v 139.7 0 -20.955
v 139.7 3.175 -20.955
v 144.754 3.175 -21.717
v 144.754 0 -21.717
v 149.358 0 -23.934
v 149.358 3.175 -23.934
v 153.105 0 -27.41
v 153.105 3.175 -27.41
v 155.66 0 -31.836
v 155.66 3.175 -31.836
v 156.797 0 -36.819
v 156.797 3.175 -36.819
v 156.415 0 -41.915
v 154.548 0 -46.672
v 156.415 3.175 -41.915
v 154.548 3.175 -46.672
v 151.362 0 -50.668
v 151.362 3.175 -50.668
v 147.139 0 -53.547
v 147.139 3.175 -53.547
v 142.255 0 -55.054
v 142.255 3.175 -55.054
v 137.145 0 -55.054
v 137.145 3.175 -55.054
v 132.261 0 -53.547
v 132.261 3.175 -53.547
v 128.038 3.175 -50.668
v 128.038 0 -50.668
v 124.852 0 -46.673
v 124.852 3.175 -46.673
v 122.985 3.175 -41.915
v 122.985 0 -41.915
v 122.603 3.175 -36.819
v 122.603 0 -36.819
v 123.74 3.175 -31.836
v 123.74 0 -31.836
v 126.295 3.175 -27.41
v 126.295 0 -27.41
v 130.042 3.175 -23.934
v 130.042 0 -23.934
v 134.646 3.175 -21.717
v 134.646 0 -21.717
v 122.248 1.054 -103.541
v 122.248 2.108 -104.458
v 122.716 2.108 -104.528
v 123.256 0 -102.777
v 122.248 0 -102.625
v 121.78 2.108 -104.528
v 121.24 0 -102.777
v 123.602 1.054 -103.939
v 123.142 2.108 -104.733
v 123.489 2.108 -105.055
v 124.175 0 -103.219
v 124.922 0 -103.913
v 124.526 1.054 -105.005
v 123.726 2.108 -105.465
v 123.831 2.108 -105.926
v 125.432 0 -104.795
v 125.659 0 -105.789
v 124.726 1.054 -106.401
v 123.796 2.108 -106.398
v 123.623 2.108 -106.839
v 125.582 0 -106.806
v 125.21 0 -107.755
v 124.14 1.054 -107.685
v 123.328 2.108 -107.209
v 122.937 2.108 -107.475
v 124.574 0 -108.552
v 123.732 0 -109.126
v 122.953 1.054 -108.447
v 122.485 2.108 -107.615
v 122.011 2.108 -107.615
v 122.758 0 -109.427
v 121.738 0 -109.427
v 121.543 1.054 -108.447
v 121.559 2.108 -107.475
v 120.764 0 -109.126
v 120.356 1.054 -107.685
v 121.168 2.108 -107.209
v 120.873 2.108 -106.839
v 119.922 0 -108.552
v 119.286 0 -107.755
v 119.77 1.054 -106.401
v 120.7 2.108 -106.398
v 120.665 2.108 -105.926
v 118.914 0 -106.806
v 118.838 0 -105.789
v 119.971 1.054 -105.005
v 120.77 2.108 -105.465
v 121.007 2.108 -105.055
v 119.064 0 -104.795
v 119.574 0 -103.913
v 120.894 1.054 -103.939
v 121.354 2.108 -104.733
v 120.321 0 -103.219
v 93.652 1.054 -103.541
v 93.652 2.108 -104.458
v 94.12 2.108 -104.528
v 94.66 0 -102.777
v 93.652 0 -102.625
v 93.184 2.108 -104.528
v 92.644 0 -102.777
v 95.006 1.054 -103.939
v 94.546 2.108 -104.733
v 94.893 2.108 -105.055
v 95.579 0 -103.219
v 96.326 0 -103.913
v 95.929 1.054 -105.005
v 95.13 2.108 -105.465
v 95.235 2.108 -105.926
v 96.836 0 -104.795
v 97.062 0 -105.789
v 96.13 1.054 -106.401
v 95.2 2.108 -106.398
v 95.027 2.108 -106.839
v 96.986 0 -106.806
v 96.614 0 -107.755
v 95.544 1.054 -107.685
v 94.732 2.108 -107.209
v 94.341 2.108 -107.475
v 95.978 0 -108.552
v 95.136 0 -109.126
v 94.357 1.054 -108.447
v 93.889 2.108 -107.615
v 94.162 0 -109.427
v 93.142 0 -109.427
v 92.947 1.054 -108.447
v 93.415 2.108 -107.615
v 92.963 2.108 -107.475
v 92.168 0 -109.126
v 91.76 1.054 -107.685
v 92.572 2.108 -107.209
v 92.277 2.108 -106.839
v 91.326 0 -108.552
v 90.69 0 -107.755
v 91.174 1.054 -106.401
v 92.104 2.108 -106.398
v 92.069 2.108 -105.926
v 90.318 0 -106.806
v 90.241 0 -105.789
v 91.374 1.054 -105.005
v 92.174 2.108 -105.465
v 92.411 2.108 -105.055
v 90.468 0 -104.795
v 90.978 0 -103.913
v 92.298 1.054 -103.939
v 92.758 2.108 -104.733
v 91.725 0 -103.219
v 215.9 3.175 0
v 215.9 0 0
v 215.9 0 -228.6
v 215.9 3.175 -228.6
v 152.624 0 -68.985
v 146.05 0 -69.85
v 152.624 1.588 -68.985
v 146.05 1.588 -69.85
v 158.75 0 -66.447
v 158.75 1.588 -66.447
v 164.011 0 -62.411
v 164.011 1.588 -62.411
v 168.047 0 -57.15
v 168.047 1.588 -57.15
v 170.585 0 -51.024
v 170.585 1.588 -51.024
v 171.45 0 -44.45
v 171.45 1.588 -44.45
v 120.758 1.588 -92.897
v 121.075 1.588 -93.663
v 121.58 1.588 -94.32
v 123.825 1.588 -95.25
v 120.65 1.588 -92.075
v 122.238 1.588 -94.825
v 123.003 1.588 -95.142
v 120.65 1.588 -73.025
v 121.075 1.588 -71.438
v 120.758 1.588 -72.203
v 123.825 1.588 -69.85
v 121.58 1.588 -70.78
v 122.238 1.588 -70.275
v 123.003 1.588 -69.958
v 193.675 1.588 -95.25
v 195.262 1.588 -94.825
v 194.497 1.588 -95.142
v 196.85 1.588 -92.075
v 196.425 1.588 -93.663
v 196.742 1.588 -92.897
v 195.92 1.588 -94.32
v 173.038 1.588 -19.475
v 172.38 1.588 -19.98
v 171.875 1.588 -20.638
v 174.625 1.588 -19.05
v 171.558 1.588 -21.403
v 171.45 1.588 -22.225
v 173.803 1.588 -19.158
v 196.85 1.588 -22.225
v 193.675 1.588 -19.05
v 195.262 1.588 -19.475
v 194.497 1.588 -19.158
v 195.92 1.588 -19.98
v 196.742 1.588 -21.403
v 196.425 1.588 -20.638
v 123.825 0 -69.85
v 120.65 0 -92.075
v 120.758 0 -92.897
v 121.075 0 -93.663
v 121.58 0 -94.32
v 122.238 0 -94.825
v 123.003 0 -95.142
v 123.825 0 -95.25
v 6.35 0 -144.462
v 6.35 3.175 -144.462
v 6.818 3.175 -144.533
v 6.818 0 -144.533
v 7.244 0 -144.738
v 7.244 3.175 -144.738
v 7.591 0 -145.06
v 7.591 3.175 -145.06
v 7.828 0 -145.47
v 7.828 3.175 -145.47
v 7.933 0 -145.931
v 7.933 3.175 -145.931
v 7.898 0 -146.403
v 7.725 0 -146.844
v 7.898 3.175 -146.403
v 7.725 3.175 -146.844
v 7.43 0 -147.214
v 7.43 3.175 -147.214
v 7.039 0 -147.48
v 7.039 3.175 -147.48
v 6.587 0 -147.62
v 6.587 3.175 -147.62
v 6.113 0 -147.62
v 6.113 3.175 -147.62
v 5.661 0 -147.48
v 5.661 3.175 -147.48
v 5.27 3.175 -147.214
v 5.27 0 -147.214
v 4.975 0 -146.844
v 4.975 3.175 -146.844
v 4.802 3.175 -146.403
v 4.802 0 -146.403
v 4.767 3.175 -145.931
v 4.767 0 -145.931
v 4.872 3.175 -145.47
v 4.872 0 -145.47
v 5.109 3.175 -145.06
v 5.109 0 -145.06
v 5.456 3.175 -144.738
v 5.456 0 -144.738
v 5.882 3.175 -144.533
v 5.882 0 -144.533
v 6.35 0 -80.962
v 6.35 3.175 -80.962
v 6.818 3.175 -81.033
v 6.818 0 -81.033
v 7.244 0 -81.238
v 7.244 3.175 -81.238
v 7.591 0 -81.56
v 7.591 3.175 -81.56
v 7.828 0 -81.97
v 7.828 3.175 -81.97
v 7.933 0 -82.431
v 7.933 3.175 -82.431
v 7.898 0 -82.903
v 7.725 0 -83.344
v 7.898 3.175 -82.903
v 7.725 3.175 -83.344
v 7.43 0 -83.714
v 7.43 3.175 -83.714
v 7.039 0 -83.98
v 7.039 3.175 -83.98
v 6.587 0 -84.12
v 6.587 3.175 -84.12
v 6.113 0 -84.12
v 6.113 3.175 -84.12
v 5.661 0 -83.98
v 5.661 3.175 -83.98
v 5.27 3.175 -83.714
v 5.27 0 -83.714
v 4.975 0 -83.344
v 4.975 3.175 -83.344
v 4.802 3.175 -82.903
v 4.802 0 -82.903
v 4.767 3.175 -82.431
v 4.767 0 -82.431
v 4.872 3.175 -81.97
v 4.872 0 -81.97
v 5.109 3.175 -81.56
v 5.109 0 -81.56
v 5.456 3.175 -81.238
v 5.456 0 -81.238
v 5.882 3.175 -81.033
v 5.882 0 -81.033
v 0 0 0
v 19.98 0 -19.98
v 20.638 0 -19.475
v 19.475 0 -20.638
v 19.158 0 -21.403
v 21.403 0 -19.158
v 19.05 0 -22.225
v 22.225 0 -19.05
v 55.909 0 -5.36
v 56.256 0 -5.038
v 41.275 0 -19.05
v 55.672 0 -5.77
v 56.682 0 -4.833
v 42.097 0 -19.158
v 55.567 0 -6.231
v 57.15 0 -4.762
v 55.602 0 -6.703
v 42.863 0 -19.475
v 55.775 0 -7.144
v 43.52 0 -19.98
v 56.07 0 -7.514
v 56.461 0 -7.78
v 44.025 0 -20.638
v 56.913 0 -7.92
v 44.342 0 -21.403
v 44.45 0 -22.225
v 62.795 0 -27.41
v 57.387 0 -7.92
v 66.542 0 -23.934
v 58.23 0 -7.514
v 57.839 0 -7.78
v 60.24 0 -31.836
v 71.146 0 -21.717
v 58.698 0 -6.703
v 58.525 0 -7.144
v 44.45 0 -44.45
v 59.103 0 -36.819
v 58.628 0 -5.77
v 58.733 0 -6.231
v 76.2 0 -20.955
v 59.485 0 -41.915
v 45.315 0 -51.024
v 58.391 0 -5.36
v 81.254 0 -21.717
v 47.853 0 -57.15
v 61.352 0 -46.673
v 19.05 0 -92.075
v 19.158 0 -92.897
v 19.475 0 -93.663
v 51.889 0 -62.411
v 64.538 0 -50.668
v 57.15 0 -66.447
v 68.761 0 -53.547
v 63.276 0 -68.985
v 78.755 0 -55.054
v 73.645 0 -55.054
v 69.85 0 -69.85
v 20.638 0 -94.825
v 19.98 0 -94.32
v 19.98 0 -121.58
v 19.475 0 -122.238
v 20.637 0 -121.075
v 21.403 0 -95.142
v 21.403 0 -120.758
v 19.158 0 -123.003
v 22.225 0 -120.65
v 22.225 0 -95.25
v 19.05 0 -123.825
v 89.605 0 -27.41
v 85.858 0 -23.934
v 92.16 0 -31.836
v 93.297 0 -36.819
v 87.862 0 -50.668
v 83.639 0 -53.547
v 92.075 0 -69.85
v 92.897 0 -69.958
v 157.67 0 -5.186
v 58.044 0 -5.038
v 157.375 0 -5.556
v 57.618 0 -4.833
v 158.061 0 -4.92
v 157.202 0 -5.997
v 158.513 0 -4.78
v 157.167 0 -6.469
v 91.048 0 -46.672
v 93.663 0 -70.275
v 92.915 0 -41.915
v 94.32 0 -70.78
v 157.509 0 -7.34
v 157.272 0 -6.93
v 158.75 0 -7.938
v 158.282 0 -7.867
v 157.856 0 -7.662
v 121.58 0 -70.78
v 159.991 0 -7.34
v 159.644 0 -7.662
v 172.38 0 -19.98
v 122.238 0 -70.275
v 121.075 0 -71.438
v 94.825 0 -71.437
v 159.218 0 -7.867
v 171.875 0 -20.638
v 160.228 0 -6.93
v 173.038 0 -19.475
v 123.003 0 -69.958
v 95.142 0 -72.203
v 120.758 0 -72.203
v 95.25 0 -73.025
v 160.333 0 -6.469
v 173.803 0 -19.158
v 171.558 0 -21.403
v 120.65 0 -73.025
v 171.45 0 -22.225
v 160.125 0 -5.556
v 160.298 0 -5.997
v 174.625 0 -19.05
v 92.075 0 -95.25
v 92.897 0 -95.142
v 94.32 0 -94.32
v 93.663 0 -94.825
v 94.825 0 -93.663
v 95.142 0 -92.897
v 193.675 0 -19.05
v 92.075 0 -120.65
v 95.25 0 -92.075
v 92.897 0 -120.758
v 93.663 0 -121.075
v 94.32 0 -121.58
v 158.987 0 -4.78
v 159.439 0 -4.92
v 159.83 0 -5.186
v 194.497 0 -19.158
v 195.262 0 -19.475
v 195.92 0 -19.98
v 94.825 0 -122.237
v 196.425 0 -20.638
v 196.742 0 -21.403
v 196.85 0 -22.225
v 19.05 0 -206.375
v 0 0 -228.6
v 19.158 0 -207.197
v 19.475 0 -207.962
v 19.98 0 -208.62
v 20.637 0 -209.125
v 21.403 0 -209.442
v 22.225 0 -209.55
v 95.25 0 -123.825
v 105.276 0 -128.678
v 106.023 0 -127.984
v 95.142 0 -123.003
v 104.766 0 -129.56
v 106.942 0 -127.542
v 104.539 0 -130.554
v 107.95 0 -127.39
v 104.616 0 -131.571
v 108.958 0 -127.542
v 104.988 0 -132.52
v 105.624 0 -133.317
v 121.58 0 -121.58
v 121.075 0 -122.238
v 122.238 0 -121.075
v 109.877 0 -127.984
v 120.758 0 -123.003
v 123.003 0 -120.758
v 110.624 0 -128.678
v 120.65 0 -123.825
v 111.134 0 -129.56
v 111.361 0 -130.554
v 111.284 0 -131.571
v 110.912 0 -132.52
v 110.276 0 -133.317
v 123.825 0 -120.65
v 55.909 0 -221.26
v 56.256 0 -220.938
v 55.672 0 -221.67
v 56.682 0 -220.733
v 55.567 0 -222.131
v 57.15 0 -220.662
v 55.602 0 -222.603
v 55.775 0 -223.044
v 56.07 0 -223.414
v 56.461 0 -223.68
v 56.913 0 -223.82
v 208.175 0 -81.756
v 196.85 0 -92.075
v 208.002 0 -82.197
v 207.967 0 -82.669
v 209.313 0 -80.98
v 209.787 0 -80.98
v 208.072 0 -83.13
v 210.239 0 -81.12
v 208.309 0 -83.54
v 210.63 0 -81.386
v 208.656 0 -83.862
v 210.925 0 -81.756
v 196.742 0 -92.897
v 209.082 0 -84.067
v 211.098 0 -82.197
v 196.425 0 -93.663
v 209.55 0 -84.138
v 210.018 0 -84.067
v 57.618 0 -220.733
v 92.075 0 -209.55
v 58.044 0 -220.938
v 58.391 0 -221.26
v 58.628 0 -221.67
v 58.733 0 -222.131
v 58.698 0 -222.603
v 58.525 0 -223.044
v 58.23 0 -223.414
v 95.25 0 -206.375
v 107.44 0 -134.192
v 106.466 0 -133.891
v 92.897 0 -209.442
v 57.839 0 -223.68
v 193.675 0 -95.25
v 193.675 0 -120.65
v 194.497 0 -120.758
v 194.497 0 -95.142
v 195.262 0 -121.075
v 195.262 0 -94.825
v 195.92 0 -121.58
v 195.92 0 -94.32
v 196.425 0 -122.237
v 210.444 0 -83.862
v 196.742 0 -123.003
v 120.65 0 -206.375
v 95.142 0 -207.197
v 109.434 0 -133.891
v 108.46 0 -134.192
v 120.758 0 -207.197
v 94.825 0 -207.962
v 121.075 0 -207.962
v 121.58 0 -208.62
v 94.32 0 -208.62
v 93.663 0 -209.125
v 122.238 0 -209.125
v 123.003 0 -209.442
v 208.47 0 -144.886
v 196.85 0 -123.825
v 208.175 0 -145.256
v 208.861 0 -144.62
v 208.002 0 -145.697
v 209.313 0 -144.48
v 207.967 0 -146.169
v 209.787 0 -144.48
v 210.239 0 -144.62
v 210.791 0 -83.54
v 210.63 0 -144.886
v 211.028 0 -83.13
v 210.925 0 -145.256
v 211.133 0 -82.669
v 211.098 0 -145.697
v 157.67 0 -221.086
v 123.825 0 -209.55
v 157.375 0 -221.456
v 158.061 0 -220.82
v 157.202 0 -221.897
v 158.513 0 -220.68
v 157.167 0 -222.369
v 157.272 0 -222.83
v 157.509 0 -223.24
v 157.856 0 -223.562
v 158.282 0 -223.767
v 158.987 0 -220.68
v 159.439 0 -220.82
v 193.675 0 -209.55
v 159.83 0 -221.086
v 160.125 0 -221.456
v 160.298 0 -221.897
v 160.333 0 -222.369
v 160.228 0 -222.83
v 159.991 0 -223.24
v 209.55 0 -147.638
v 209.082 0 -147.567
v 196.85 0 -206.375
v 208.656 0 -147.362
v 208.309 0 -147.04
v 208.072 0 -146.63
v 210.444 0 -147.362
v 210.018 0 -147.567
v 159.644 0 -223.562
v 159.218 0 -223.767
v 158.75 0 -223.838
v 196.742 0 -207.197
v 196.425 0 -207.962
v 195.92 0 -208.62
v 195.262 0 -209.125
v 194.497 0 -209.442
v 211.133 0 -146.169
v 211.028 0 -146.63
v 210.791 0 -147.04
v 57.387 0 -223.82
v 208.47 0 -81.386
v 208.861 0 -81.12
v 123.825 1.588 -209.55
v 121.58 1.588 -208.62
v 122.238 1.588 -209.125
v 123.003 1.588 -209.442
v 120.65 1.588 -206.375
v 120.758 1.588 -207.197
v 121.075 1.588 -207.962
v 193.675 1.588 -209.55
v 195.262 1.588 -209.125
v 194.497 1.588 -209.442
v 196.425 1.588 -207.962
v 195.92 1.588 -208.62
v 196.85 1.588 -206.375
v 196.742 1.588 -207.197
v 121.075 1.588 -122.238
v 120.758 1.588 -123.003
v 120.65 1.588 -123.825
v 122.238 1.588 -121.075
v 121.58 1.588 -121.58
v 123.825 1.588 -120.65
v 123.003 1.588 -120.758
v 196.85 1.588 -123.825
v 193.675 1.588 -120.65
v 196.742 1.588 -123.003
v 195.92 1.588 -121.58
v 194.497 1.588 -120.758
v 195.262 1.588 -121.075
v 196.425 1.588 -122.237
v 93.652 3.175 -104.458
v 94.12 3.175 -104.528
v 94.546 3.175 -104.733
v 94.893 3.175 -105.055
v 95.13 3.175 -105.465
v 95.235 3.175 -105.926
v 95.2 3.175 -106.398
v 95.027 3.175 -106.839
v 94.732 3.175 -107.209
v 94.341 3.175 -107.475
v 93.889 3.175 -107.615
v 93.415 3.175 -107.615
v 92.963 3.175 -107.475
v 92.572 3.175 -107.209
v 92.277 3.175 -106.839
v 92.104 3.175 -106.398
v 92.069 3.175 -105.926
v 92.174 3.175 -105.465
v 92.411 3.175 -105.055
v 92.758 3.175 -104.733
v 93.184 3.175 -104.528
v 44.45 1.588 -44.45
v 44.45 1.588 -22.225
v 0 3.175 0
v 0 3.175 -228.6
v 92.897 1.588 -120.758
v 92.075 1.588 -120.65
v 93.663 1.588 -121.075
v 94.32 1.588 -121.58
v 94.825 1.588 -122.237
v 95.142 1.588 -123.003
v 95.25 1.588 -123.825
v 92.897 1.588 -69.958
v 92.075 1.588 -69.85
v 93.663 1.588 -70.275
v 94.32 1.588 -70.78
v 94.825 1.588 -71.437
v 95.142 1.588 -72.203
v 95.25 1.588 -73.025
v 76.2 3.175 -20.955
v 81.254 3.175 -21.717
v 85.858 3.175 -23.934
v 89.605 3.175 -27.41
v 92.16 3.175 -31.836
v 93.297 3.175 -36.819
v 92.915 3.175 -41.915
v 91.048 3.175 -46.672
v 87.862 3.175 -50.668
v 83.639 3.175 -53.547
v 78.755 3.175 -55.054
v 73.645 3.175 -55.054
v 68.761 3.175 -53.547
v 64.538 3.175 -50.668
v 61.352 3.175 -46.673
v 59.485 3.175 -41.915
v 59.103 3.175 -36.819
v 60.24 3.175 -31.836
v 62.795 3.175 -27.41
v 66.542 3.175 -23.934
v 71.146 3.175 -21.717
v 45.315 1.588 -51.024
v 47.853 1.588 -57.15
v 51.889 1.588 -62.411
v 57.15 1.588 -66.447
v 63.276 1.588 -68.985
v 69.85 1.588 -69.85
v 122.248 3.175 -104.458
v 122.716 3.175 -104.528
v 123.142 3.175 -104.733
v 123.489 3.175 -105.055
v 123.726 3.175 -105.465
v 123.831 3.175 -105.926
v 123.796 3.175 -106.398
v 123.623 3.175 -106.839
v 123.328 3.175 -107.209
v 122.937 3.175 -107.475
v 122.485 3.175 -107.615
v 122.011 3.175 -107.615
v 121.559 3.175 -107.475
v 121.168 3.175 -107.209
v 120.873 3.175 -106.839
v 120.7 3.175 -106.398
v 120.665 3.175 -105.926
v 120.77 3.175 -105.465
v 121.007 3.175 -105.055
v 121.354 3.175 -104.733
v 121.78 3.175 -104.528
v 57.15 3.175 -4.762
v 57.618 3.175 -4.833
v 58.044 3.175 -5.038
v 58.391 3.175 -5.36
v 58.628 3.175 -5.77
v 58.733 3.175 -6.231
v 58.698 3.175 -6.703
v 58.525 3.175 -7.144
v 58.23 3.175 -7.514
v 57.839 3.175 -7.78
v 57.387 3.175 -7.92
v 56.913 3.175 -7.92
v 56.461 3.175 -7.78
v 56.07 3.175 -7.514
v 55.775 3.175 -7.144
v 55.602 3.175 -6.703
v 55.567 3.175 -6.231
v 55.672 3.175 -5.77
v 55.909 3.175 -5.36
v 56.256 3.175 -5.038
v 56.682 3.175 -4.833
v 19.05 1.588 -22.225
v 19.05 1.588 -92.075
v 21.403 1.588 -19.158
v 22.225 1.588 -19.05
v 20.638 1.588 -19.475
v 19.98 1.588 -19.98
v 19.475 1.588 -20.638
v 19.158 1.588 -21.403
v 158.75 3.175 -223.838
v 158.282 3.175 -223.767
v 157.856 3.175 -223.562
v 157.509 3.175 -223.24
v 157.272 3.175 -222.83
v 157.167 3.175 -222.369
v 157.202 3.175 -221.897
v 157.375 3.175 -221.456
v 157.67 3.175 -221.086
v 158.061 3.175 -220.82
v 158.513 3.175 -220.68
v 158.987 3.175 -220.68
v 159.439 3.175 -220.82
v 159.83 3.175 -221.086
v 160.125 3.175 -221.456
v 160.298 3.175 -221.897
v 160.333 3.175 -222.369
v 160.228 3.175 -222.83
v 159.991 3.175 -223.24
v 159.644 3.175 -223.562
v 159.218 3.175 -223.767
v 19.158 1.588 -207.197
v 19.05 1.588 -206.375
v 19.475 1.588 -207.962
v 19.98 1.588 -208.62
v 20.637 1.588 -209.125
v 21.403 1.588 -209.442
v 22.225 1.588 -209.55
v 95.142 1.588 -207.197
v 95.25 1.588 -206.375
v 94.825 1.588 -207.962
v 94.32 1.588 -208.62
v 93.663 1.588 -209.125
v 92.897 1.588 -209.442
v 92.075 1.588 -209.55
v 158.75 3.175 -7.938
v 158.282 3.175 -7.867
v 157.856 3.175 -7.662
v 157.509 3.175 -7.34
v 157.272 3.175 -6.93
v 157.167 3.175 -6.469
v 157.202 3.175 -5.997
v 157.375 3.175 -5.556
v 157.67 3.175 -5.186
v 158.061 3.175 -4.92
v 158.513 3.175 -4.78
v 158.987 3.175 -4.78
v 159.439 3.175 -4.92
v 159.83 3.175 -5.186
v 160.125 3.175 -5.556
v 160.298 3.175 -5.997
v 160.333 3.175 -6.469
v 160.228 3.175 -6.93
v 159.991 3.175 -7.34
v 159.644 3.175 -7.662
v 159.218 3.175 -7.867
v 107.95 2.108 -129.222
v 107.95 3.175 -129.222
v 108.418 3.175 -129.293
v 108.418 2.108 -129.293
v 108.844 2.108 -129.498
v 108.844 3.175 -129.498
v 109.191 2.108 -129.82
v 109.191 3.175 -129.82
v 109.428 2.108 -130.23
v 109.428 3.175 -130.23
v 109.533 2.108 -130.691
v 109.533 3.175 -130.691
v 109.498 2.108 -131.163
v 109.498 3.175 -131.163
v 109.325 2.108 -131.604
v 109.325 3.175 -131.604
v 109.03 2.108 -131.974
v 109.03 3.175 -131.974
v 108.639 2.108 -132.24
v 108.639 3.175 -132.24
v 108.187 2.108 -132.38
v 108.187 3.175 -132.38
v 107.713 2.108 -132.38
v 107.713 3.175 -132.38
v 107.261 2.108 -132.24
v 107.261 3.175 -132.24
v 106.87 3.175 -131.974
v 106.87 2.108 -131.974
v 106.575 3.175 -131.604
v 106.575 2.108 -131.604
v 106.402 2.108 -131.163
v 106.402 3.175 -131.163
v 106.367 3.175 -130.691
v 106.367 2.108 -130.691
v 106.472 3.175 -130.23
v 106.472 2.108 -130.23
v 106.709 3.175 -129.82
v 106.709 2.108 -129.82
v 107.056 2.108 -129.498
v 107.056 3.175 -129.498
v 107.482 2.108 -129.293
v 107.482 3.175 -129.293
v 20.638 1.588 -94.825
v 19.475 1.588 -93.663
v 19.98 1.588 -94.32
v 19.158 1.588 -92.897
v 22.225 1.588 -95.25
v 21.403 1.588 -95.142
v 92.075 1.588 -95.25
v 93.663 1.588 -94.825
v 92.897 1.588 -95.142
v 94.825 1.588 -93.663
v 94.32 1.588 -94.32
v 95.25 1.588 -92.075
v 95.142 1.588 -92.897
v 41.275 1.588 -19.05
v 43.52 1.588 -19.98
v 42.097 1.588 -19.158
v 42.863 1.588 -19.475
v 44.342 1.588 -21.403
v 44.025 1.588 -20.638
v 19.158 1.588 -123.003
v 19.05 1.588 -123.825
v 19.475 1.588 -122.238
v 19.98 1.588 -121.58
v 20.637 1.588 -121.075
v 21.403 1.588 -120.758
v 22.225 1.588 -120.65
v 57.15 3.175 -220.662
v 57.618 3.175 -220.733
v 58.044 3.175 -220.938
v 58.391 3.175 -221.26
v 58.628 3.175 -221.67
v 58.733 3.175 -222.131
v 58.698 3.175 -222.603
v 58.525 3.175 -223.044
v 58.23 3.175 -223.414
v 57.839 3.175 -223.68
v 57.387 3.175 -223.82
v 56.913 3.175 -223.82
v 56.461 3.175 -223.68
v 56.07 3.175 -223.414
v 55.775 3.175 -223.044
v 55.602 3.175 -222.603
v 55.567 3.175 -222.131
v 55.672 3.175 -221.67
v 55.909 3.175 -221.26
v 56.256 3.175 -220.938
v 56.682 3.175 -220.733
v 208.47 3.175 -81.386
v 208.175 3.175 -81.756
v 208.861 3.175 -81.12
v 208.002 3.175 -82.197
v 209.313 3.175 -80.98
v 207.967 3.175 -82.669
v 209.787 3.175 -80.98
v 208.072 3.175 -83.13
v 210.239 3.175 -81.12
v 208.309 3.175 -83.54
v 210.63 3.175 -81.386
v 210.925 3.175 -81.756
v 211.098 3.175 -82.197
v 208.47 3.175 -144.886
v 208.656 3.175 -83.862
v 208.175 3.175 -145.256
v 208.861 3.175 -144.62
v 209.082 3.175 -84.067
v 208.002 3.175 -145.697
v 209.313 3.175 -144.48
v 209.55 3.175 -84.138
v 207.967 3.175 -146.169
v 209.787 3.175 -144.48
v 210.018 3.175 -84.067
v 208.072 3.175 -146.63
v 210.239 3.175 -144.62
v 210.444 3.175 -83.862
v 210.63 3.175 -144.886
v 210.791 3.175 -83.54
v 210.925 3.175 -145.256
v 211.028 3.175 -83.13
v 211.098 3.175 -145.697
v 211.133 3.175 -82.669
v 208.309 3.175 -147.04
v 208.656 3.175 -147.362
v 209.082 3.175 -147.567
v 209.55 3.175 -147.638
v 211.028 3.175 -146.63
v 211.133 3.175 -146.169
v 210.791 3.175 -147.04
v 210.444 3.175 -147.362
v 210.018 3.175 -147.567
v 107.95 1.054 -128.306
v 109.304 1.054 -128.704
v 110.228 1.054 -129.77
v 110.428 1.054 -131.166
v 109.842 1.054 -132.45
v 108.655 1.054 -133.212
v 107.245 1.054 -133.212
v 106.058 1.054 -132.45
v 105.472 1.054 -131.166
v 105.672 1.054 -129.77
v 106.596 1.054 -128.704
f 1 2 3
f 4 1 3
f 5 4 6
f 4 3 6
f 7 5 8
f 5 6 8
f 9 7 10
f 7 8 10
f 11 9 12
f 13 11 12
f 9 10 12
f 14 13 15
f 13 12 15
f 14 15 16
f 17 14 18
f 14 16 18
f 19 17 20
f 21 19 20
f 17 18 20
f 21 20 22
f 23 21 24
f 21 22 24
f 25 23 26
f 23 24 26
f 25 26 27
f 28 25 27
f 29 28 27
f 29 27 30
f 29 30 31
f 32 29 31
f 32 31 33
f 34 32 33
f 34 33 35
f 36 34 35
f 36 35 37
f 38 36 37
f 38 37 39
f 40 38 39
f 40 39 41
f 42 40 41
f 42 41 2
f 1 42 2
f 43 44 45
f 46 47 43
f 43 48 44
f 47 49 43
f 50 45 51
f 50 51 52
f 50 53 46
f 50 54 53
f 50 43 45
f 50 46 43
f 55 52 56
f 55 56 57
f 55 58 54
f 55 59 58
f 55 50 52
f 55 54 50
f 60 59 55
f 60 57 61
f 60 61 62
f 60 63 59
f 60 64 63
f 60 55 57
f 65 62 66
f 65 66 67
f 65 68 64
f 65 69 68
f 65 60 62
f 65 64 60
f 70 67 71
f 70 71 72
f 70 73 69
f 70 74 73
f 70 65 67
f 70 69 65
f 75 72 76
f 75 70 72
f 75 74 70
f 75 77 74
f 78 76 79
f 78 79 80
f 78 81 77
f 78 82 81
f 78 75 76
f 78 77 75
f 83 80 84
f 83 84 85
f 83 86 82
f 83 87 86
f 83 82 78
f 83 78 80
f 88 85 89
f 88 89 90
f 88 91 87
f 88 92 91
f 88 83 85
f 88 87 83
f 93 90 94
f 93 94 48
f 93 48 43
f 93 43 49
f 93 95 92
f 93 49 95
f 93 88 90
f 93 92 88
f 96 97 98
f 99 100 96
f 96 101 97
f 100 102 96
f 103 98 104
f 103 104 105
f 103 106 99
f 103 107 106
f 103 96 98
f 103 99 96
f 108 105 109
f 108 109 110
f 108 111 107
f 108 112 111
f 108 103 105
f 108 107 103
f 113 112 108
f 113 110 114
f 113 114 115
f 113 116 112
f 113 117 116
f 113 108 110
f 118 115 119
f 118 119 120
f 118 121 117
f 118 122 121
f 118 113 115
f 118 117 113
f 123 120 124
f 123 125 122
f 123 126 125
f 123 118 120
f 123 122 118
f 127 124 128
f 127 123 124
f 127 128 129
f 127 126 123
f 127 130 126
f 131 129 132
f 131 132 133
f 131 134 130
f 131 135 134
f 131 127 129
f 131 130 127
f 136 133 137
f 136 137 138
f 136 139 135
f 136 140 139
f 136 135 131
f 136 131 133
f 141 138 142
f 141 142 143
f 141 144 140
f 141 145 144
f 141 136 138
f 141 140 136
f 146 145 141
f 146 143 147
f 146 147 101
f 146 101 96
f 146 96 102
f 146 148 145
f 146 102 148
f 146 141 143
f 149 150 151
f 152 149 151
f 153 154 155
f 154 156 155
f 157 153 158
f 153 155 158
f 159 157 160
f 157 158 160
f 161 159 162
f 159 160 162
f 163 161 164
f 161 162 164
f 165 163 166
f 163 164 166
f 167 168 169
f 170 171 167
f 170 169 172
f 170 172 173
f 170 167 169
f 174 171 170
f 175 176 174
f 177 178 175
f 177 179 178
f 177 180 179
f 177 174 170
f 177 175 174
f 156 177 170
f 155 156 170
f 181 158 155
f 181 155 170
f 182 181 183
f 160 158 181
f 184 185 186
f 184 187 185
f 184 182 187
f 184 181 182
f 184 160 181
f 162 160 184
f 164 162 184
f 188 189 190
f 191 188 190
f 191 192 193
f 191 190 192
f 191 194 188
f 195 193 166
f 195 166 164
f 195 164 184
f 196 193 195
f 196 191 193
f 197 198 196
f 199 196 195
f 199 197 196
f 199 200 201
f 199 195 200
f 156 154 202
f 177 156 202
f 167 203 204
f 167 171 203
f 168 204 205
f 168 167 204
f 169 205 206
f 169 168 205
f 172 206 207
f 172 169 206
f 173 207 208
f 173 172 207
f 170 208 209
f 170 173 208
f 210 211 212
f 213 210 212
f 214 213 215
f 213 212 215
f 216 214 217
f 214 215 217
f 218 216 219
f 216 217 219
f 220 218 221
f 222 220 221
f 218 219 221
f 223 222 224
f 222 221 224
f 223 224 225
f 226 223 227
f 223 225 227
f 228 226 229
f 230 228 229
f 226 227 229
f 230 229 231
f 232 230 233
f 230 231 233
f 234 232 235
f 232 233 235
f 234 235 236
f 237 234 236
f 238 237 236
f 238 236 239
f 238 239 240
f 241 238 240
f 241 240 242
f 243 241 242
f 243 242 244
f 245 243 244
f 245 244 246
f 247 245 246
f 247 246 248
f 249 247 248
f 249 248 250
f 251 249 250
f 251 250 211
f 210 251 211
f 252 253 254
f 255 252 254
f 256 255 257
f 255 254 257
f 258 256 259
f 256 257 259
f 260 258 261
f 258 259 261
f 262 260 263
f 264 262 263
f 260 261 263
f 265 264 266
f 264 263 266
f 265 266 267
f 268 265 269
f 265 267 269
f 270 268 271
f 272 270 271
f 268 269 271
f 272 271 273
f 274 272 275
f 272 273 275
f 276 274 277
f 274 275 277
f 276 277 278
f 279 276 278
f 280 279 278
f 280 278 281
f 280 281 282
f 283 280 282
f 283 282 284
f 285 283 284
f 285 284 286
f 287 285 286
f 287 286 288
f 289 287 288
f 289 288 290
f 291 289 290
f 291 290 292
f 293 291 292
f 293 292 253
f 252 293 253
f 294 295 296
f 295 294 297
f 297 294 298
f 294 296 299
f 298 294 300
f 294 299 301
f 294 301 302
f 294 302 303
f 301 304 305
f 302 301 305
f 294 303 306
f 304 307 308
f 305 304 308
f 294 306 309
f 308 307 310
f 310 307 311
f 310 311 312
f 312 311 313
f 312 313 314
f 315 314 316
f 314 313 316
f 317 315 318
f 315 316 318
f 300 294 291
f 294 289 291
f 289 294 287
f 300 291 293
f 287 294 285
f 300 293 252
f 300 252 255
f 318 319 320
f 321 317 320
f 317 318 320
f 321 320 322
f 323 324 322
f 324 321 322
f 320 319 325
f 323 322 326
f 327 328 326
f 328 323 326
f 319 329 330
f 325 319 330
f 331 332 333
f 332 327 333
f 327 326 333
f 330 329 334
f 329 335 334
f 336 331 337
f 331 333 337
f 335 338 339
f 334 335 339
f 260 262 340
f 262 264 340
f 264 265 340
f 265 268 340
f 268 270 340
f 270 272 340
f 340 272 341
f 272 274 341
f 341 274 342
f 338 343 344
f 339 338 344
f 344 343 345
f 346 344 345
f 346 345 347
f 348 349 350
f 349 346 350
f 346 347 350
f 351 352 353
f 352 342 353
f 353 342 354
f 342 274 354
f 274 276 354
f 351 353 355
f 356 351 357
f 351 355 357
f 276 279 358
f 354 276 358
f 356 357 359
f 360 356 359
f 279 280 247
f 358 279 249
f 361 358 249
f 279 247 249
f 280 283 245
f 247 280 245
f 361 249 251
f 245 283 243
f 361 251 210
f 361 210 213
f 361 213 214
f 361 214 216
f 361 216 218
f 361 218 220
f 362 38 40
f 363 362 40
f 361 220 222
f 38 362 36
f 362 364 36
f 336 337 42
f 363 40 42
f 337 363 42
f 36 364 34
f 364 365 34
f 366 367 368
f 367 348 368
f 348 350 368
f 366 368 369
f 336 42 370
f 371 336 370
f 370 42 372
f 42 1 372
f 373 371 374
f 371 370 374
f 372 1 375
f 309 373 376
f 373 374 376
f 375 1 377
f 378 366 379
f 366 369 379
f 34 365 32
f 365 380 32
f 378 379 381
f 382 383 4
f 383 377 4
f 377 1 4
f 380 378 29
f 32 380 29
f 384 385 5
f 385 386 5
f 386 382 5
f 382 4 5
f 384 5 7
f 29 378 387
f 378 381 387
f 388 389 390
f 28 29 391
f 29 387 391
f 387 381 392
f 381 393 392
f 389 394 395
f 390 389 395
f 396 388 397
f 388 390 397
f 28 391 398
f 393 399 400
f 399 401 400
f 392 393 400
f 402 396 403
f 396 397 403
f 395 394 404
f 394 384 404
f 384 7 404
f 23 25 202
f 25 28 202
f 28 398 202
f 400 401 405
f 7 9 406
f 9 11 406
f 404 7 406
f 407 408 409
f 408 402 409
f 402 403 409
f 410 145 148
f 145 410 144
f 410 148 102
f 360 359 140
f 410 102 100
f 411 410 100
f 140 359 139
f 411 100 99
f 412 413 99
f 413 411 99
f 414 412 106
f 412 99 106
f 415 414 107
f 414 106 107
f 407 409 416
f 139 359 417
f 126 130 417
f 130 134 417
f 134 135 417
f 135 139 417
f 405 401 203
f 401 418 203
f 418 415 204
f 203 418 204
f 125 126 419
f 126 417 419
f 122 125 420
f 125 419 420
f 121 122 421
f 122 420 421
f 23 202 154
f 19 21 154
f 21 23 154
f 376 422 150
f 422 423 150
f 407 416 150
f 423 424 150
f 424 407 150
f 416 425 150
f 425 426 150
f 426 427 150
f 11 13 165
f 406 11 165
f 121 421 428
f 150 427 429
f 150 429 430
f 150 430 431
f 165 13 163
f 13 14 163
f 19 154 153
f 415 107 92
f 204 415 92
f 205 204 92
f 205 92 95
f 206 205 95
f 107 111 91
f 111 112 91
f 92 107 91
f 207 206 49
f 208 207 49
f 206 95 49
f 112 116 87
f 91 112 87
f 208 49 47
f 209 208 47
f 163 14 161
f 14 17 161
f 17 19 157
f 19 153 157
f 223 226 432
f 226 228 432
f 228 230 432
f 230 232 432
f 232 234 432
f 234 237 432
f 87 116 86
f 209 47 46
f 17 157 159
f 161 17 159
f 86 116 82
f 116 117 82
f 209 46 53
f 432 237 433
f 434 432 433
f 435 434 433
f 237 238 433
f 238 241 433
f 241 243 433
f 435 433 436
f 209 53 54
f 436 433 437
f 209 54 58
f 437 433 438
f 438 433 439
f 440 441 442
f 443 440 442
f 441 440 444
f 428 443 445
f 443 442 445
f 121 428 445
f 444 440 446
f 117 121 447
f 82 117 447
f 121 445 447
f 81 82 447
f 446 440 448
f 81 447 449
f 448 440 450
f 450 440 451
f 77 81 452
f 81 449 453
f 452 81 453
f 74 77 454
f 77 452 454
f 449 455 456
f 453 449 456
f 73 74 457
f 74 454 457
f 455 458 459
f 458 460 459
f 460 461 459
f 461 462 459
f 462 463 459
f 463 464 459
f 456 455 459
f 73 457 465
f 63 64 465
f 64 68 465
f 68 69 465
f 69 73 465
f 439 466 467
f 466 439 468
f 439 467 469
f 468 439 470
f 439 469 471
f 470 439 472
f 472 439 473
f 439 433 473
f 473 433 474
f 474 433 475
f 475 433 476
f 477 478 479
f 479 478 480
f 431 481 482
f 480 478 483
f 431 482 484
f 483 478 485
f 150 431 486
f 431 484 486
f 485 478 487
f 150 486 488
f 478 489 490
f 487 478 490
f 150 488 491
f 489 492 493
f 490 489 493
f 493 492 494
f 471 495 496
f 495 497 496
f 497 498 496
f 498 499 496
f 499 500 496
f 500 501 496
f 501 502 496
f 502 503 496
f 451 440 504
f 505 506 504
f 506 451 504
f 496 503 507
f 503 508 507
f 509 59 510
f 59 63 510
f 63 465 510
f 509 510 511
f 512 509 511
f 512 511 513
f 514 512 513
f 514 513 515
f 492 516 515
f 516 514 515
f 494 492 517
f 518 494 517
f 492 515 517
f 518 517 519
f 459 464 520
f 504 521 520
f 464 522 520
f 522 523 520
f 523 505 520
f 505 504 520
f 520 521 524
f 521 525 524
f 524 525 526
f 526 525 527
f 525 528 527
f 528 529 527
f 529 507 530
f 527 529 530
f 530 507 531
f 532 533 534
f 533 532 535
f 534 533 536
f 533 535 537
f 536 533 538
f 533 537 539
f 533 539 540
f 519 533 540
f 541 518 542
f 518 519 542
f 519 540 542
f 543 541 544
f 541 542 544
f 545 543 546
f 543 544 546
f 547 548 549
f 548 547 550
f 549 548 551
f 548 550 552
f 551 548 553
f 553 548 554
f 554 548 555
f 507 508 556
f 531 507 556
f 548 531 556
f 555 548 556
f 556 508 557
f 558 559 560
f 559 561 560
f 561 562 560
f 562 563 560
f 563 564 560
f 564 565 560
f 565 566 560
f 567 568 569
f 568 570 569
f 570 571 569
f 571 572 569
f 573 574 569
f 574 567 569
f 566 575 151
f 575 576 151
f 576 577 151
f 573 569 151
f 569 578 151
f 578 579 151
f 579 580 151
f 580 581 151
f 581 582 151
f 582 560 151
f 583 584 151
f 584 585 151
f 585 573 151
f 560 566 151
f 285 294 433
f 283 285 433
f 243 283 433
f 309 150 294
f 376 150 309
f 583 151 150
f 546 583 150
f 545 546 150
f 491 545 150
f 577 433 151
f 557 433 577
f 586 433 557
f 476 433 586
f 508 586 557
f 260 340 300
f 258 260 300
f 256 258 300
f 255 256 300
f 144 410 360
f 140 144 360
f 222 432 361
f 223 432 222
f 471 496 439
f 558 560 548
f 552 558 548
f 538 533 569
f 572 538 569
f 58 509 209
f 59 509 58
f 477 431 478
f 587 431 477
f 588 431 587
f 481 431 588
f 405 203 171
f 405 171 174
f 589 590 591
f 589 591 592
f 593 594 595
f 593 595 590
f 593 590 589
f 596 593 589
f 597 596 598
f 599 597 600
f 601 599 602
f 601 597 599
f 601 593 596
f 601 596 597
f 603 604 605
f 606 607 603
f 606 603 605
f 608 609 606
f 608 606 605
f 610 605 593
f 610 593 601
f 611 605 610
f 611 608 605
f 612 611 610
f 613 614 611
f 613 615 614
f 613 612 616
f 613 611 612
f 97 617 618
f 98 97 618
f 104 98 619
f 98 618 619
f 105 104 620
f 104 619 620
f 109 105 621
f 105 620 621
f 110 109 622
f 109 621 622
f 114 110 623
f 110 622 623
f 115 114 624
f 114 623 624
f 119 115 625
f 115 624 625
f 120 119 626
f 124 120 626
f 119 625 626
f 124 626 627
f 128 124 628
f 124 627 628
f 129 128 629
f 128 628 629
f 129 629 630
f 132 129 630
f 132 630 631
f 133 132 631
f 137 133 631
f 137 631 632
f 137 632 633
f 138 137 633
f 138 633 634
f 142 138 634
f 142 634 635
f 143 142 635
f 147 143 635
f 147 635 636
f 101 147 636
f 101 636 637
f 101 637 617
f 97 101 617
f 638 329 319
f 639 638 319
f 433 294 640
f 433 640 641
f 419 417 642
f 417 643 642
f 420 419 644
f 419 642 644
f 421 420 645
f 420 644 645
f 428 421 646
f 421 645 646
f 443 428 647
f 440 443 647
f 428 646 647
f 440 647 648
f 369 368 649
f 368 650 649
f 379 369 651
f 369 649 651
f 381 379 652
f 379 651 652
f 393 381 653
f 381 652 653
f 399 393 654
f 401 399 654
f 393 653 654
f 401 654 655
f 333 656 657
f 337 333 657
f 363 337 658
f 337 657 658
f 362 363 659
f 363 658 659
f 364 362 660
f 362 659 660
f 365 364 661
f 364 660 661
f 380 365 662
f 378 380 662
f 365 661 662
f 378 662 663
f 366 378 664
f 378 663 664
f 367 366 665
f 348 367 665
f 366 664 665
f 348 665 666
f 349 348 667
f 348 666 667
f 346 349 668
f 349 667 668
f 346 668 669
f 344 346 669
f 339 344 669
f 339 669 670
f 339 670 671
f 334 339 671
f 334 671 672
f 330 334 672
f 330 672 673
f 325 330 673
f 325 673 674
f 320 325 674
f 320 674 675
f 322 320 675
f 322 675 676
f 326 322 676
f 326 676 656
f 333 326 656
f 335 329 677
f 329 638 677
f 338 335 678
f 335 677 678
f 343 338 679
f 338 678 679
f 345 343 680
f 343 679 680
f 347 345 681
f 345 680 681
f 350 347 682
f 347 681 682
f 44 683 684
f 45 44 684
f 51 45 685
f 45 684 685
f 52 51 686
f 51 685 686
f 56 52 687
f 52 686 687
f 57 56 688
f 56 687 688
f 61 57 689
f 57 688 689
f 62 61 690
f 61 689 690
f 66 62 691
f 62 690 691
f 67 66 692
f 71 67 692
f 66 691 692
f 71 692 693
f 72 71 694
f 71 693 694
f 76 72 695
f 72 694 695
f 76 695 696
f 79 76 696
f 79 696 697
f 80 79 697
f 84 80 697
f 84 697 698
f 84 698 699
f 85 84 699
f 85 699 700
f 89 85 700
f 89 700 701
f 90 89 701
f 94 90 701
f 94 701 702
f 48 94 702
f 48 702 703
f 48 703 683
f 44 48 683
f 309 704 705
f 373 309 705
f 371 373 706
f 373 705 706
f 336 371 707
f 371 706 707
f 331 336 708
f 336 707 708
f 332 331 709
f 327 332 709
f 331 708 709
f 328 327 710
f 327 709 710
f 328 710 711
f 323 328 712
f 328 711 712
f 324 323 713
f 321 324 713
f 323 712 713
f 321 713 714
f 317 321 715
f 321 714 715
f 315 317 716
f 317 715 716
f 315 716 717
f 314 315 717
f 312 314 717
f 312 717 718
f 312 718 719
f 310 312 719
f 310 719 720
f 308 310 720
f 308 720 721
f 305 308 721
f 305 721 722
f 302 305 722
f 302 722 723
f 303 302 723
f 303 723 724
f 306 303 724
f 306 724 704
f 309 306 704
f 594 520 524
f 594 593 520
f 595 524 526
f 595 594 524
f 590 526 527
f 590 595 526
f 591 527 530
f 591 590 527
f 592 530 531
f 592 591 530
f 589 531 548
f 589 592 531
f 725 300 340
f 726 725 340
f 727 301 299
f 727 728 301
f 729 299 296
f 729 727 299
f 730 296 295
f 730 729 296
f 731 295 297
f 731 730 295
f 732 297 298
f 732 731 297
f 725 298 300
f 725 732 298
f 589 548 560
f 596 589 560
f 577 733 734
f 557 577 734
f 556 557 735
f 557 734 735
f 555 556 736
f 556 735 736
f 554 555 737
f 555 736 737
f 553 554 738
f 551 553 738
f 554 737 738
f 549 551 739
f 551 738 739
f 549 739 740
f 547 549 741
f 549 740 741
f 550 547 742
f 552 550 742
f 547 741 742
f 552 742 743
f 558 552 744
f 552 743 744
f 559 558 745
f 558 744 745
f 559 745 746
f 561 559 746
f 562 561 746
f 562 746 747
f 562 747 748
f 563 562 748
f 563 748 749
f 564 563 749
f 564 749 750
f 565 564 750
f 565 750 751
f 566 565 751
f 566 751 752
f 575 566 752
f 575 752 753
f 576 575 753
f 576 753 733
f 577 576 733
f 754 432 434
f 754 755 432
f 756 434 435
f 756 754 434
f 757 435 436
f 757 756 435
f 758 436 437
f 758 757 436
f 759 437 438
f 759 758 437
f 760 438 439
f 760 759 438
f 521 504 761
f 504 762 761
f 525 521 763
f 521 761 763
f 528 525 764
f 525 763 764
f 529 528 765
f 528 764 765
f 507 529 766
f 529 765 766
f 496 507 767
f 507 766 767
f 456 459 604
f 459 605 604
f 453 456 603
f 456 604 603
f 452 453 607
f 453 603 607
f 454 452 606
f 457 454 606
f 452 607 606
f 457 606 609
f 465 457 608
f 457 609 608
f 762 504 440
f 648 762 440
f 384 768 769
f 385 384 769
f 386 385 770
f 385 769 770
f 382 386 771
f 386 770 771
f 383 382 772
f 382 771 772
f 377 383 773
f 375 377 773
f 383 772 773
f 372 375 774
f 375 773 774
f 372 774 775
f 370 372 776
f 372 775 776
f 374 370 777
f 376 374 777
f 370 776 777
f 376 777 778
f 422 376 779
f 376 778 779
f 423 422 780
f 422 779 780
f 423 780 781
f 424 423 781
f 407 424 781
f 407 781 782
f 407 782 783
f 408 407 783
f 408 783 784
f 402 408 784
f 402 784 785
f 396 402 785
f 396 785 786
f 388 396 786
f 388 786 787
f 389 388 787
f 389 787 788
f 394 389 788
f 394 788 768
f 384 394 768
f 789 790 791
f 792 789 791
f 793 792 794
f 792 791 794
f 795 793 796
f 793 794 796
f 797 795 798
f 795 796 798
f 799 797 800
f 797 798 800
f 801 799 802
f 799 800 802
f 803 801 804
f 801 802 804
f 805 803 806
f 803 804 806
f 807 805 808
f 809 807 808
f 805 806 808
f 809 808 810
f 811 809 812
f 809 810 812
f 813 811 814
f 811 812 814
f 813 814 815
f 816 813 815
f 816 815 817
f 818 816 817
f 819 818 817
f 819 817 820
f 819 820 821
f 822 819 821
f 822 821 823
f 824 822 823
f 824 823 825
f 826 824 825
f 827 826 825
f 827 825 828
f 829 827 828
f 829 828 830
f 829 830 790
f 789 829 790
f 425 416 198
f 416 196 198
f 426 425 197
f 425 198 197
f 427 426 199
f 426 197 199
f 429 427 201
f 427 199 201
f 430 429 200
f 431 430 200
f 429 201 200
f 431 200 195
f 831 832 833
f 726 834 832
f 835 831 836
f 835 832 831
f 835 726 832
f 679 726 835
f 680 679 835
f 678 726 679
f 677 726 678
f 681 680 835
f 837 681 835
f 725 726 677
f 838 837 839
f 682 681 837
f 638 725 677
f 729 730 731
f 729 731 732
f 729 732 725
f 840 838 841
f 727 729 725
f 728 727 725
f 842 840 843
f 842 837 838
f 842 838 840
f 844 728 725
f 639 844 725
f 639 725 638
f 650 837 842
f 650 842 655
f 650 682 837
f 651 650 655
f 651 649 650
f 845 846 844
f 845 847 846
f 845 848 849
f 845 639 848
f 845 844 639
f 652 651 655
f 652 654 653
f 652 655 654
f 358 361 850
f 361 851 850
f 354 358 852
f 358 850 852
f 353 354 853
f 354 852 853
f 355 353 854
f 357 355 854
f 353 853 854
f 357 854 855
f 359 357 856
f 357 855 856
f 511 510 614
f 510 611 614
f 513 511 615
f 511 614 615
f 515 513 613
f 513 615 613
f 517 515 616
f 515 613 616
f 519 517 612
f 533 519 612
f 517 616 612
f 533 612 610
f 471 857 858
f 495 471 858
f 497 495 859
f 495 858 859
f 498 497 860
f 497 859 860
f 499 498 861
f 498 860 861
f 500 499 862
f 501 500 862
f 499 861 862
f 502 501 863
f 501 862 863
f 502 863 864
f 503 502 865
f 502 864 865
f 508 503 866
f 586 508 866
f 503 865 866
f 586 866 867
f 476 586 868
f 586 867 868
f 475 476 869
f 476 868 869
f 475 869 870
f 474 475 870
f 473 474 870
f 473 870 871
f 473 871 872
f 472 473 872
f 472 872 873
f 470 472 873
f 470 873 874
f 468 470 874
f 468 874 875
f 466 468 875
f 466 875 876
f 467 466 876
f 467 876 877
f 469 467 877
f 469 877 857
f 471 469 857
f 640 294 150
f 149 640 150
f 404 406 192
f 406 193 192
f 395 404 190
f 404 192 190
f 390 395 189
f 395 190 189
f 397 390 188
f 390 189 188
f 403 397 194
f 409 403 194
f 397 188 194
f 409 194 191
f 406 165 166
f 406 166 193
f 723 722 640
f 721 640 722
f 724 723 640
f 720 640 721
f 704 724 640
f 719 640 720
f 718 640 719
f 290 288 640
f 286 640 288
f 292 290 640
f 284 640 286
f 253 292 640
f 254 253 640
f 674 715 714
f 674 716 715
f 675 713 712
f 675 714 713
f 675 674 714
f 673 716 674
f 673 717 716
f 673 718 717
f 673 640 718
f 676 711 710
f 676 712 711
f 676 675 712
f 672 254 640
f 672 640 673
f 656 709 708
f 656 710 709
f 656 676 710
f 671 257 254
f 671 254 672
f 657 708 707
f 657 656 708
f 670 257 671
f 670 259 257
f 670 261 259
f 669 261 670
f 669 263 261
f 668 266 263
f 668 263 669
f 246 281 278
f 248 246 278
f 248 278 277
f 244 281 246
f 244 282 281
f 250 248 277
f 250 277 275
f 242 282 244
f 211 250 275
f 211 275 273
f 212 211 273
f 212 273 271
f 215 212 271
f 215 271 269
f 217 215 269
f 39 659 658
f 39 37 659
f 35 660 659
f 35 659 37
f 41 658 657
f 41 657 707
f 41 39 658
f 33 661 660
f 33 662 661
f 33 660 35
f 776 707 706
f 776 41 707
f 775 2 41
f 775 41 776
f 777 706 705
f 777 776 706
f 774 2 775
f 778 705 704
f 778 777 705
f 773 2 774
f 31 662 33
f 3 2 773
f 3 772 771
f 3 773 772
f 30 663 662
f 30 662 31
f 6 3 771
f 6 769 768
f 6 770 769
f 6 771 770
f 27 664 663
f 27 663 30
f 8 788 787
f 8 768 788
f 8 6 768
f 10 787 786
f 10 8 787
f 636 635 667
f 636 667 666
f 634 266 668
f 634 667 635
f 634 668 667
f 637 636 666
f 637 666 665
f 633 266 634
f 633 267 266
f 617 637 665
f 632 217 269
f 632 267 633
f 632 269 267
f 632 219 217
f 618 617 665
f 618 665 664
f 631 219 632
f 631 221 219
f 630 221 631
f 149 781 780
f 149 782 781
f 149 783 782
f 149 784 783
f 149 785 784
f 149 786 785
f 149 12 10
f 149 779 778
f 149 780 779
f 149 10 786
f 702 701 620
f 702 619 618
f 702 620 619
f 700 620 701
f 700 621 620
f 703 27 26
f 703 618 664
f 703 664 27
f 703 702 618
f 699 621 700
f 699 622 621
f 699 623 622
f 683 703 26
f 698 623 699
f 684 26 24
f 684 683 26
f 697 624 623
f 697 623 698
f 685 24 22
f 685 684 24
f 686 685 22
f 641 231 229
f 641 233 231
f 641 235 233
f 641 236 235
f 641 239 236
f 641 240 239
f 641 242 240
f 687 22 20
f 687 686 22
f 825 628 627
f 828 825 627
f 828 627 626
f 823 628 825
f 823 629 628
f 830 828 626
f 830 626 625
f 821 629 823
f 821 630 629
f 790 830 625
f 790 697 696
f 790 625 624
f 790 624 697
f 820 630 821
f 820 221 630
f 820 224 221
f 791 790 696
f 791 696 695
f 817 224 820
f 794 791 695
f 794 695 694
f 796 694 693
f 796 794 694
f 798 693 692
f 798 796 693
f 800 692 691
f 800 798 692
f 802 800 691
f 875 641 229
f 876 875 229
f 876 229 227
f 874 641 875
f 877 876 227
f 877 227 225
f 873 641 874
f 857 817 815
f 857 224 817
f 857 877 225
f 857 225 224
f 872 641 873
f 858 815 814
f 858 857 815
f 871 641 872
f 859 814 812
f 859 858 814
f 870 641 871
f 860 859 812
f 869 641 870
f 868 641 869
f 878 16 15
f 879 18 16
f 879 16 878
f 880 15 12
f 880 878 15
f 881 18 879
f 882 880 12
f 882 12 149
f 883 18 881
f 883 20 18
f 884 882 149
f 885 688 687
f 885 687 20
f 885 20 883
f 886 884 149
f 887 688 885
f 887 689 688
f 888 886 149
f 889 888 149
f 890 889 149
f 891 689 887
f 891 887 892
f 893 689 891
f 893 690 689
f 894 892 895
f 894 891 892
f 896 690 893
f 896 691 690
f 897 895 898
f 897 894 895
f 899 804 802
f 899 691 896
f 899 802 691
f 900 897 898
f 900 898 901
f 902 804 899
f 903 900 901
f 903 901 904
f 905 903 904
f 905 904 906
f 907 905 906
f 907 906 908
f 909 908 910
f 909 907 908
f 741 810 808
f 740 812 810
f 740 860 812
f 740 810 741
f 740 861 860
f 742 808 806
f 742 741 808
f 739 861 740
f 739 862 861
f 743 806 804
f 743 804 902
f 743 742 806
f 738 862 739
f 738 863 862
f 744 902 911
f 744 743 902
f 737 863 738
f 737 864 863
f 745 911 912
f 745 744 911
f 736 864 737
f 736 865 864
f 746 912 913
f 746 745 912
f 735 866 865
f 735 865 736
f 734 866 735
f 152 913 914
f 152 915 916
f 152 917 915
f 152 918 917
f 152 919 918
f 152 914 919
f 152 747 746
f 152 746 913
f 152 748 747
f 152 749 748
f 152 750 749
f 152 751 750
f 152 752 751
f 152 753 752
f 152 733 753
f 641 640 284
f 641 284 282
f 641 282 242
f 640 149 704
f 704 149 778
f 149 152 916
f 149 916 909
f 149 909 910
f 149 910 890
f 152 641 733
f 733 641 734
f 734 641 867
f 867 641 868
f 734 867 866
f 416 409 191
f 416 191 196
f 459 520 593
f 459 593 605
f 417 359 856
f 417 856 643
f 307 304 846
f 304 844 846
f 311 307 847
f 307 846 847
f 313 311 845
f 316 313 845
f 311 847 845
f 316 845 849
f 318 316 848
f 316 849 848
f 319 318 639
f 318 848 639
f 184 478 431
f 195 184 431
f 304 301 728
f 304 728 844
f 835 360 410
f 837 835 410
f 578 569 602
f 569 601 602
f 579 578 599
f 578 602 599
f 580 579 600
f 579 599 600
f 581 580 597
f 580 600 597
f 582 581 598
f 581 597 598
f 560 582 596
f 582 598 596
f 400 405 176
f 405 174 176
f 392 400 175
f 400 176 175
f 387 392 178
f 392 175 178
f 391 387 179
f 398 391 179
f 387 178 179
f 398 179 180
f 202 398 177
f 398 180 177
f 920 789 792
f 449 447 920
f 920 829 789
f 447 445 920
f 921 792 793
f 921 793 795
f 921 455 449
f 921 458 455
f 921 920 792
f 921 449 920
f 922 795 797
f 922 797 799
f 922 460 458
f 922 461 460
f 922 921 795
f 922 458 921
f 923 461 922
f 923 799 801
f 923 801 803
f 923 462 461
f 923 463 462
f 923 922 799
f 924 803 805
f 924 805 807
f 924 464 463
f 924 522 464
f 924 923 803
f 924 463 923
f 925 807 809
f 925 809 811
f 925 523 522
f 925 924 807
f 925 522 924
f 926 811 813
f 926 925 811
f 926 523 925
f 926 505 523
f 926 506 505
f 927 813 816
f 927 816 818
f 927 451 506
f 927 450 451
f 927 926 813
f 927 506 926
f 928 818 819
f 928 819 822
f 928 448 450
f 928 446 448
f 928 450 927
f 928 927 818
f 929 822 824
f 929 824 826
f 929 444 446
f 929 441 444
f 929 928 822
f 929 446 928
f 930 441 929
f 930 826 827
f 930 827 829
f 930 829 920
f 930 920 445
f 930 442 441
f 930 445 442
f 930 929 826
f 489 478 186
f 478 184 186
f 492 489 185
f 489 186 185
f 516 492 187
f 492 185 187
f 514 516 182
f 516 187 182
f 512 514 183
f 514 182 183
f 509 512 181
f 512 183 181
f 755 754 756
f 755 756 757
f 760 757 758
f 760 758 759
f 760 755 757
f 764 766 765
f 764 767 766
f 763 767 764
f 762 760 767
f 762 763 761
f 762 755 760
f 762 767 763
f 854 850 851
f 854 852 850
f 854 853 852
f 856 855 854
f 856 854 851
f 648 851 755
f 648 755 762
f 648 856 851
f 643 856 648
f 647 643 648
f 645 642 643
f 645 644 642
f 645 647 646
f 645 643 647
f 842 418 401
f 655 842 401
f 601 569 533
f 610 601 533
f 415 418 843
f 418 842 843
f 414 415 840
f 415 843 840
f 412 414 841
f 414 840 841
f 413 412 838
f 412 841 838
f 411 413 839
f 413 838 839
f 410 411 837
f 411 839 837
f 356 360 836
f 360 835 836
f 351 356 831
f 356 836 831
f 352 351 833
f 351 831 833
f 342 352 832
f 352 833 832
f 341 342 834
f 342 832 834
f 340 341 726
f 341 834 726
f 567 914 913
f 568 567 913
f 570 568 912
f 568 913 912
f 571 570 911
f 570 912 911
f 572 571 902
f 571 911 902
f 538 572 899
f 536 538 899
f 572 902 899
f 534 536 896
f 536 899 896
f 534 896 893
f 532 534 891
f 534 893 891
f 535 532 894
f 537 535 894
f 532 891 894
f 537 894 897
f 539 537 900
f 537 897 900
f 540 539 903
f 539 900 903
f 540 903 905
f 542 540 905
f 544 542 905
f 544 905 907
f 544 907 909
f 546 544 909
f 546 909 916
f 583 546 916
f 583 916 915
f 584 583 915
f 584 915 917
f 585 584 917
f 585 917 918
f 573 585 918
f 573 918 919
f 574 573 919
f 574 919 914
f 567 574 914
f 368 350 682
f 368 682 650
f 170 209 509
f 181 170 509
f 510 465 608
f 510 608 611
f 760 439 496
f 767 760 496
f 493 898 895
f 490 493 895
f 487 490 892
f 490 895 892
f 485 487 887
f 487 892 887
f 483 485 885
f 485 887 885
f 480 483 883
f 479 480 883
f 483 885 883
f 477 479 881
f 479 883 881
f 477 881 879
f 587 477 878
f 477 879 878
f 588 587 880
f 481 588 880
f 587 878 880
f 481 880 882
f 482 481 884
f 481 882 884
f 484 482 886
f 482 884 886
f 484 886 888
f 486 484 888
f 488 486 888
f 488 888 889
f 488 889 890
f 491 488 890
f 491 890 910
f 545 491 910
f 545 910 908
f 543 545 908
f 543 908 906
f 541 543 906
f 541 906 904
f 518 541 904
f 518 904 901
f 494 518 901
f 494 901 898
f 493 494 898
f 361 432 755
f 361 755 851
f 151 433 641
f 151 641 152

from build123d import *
from OCP.BRepFilletAPI import BRepFilletAPI_MakeChamfer

# Parameters (mm, degrees)
SKETCH1_W           = 215.9
SKETCH1_H           = 228.6
BOSS_EXTRUDE1_DEPTH = 3.175
SKETCH2_R           = 17.145
CUT_EXTRUDE1_DEPTH  = 315.453256661
SKETCH3_R           = 1.5875
CUT_EXTRUDE2_DEPTH  = 315.453256661
SKETCH4_R           = 1.5875
CUT_EXTRUDE3_DEPTH  = 315.453256661
CHAMFER1_SIZE       = 2.1082
CHAMFER1_SIZE2      = 1.832630301
SKETCH5_W           = 25.4
SKETCH5_H           = 50.8
SKETCH5_H_2         = 25.4
SKETCH5_W_2         = 50.8
SKETCH5_W_3         = 76.2
SKETCH5_H_3         = 88.9
CUT_EXTRUDE4_DEPTH  = 1.5875
FILLET1_R           = 3.175
FILLET2_R           = 25.4


with BuildPart() as part:
    # Sketch1 → Boss-Extrude1 (new body)
    with BuildSketch(Plane(origin=(0, 0, 0), x_dir=(1, 0, 0), z_dir=(0, 1, 0))):
        with Locations((107.95, 114.3)):
            Rectangle(SKETCH1_W, SKETCH1_H)
    extrude(amount=BOSS_EXTRUDE1_DEPTH)

    # Sketch2 → Cut-Extrude1 (cut, through all)
    with BuildSketch(Plane(origin=(0, 3.175, 0), x_dir=(1, 0, 0), z_dir=(0, 1, 0))):
        with Locations(Location((139.7, 38.1, 0), (0, 0, 270))):
            Circle(SKETCH2_R)
        with Locations(Location((76.2, 38.1, 0), (0, 0, 270))):
            Circle(SKETCH2_R)
    extrude(amount=-CUT_EXTRUDE1_DEPTH, mode=Mode.SUBTRACT)

    # Sketch3 → Cut-Extrude2 (cut, through all)
    with BuildSketch(Plane(origin=(0, 3.175, 0), x_dir=(1, 0, 0), z_dir=(0, 1, 0))):
        with Locations(Location((107.95, 130.81, 0), (0, 0, 270))):
            Circle(SKETCH3_R)
        with Locations(Location((122.248079416, 106.045, 0), (0, 0, 270))):
            Circle(SKETCH3_R)
        with Locations(Location((93.651920584, 106.045, 0), (0, 0, 270))):
            Circle(SKETCH3_R)
    extrude(amount=-CUT_EXTRUDE2_DEPTH, mode=Mode.SUBTRACT)

    # Sketch4 → Cut-Extrude3 (cut, through all)
    with BuildSketch(Plane(origin=(0, 3.175, 0), x_dir=(1, 0, 0), z_dir=(0, 1, 0))):
        with Locations(Location((6.35, 146.05, 0), (0, 0, 270))):
            Circle(SKETCH4_R)
        with Locations(Location((6.35, 82.55, 0), (0, 0, 270))):
            Circle(SKETCH4_R)
        with Locations(Location((57.15, 6.35, 0), (0, 0, 270))):
            Circle(SKETCH4_R)
        with Locations(Location((57.15, 222.25, 0), (0, 0, 270))):
            Circle(SKETCH4_R)
        with Locations(Location((158.75, 6.35, 0), (0, 0, 90))):
            Circle(SKETCH4_R)
        with Locations(Location((209.55, 82.55, 0), (0, 0, 90))):
            Circle(SKETCH4_R)
        with Locations(Location((209.55, 146.05, 0), (0, 0, 90))):
            Circle(SKETCH4_R)
        with Locations(Location((158.75, 222.25, 0), (0, 0, 90))):
            Circle(SKETCH4_R)
    extrude(amount=-CUT_EXTRUDE3_DEPTH, mode=Mode.SUBTRACT)

    # Chamfer1: one chamfer whose edges measure the first distance from different faces: ONE call of the kernel's chamfer builder (chamfer() names one face for all edges)
    chamfer1_edges_1 = [part.edges().sort_by_distance(p)[0] for p in [
        (107.95, 0, -132.3975),
    ]]
    chamfer1_side_1 = [part.faces().sort_by_distance(p)[0] for p in [
        (107.95, 1.5875, -132.3975),
    ]]
    chamfer1_edges_2 = [part.edges().sort_by_distance(p)[0] for p in [
        (122.248079416, 0, -107.6325),
    ]]
    chamfer1_side_2 = [part.faces().sort_by_distance(p)[0] for p in [
        (122.248079416, 1.5875, -107.6325),
    ]]
    chamfer1_edges_3 = [part.edges().sort_by_distance(p)[0] for p in [
        (93.651920584, 0, -107.6325),
    ]]
    chamfer1_side_3 = [part.faces().sort_by_distance(p)[0] for p in [
        (93.651920584, 1.5875, -107.6325),
    ]]
    chamfer1 = BRepFilletAPI_MakeChamfer(part.part.solid().wrapped)
    for e in chamfer1_edges_1:
        chamfer1.Add(CHAMFER1_SIZE, CHAMFER1_SIZE2, e.wrapped, chamfer1_side_1[0].wrapped)  # the first distance lies on this face
    for e in chamfer1_edges_2:
        chamfer1.Add(CHAMFER1_SIZE, CHAMFER1_SIZE2, e.wrapped, chamfer1_side_2[0].wrapped)  # the first distance lies on this face
    for e in chamfer1_edges_3:
        chamfer1.Add(CHAMFER1_SIZE, CHAMFER1_SIZE2, e.wrapped, chamfer1_side_3[0].wrapped)  # the first distance lies on this face
    add(Compound.cast(chamfer1.Shape()), mode=Mode.REPLACE)

    # Sketch5 → Cut-Extrude4 (cut)
    with BuildSketch(Plane.XZ):
        with Locations((31.75, -44.45)):
            Rectangle(SKETCH5_W, SKETCH5_H)
        with Locations((31.75, -82.55)):
            Rectangle(SKETCH5_W, SKETCH5_H_2)
        with Locations((69.85, -82.55)):
            Rectangle(SKETCH5_W_2, SKETCH5_H_2)
        with Locations((57.15, -165.1)):
            Rectangle(SKETCH5_W_3, SKETCH5_H_3)
        with Locations((158.75, -165.1)):
            Rectangle(SKETCH5_W_3, SKETCH5_H_3)
        with Locations((146.05, -82.55)):
            Rectangle(SKETCH5_W_2, SKETCH5_H_2)
        with Locations((184.15, -82.55)):
            Rectangle(SKETCH5_W, SKETCH5_H_2)
        with Locations((184.15, -44.45)):
            Rectangle(SKETCH5_W, SKETCH5_H)
    extrude(amount=-CUT_EXTRUDE4_DEPTH, mode=Mode.SUBTRACT)

    # Fillet1
    fillet1_edges = [part.edges().sort_by_distance(p)[0] for p in [
        (120.65, 0.79375, -120.65),
        (196.85, 0.79375, -120.65),
        (196.85, 0.79375, -209.55),
        (120.65, 0.79375, -209.55),
        (19.05, 0.79375, -120.65),
        (95.25, 0.79375, -120.65),
        (95.25, 0.79375, -209.55),
        (19.05, 0.79375, -209.55),
        (19.05, 0.79375, -95.25),
        (19.05, 0.79375, -19.05),
        (44.45, 0.79375, -19.05),
        (95.25, 0.79375, -69.85),
        (95.25, 0.79375, -95.25),
        (196.85, 0.79375, -95.25),
        (120.65, 0.79375, -95.25),
        (120.65, 0.79375, -69.85),
        (171.45, 0.79375, -19.05),
        (196.85, 0.79375, -19.05),
    ]]
    fillet(fillet1_edges, radius=FILLET1_R)

    # Fillet2
    fillet2_edges = [part.edges().sort_by_distance(p)[0] for p in [
        (44.45, 0.79375, -69.85),
        (171.45, 0.79375, -69.85),
    ]]
    fillet(fillet2_edges, radius=FILLET2_R)


solid = part.part
